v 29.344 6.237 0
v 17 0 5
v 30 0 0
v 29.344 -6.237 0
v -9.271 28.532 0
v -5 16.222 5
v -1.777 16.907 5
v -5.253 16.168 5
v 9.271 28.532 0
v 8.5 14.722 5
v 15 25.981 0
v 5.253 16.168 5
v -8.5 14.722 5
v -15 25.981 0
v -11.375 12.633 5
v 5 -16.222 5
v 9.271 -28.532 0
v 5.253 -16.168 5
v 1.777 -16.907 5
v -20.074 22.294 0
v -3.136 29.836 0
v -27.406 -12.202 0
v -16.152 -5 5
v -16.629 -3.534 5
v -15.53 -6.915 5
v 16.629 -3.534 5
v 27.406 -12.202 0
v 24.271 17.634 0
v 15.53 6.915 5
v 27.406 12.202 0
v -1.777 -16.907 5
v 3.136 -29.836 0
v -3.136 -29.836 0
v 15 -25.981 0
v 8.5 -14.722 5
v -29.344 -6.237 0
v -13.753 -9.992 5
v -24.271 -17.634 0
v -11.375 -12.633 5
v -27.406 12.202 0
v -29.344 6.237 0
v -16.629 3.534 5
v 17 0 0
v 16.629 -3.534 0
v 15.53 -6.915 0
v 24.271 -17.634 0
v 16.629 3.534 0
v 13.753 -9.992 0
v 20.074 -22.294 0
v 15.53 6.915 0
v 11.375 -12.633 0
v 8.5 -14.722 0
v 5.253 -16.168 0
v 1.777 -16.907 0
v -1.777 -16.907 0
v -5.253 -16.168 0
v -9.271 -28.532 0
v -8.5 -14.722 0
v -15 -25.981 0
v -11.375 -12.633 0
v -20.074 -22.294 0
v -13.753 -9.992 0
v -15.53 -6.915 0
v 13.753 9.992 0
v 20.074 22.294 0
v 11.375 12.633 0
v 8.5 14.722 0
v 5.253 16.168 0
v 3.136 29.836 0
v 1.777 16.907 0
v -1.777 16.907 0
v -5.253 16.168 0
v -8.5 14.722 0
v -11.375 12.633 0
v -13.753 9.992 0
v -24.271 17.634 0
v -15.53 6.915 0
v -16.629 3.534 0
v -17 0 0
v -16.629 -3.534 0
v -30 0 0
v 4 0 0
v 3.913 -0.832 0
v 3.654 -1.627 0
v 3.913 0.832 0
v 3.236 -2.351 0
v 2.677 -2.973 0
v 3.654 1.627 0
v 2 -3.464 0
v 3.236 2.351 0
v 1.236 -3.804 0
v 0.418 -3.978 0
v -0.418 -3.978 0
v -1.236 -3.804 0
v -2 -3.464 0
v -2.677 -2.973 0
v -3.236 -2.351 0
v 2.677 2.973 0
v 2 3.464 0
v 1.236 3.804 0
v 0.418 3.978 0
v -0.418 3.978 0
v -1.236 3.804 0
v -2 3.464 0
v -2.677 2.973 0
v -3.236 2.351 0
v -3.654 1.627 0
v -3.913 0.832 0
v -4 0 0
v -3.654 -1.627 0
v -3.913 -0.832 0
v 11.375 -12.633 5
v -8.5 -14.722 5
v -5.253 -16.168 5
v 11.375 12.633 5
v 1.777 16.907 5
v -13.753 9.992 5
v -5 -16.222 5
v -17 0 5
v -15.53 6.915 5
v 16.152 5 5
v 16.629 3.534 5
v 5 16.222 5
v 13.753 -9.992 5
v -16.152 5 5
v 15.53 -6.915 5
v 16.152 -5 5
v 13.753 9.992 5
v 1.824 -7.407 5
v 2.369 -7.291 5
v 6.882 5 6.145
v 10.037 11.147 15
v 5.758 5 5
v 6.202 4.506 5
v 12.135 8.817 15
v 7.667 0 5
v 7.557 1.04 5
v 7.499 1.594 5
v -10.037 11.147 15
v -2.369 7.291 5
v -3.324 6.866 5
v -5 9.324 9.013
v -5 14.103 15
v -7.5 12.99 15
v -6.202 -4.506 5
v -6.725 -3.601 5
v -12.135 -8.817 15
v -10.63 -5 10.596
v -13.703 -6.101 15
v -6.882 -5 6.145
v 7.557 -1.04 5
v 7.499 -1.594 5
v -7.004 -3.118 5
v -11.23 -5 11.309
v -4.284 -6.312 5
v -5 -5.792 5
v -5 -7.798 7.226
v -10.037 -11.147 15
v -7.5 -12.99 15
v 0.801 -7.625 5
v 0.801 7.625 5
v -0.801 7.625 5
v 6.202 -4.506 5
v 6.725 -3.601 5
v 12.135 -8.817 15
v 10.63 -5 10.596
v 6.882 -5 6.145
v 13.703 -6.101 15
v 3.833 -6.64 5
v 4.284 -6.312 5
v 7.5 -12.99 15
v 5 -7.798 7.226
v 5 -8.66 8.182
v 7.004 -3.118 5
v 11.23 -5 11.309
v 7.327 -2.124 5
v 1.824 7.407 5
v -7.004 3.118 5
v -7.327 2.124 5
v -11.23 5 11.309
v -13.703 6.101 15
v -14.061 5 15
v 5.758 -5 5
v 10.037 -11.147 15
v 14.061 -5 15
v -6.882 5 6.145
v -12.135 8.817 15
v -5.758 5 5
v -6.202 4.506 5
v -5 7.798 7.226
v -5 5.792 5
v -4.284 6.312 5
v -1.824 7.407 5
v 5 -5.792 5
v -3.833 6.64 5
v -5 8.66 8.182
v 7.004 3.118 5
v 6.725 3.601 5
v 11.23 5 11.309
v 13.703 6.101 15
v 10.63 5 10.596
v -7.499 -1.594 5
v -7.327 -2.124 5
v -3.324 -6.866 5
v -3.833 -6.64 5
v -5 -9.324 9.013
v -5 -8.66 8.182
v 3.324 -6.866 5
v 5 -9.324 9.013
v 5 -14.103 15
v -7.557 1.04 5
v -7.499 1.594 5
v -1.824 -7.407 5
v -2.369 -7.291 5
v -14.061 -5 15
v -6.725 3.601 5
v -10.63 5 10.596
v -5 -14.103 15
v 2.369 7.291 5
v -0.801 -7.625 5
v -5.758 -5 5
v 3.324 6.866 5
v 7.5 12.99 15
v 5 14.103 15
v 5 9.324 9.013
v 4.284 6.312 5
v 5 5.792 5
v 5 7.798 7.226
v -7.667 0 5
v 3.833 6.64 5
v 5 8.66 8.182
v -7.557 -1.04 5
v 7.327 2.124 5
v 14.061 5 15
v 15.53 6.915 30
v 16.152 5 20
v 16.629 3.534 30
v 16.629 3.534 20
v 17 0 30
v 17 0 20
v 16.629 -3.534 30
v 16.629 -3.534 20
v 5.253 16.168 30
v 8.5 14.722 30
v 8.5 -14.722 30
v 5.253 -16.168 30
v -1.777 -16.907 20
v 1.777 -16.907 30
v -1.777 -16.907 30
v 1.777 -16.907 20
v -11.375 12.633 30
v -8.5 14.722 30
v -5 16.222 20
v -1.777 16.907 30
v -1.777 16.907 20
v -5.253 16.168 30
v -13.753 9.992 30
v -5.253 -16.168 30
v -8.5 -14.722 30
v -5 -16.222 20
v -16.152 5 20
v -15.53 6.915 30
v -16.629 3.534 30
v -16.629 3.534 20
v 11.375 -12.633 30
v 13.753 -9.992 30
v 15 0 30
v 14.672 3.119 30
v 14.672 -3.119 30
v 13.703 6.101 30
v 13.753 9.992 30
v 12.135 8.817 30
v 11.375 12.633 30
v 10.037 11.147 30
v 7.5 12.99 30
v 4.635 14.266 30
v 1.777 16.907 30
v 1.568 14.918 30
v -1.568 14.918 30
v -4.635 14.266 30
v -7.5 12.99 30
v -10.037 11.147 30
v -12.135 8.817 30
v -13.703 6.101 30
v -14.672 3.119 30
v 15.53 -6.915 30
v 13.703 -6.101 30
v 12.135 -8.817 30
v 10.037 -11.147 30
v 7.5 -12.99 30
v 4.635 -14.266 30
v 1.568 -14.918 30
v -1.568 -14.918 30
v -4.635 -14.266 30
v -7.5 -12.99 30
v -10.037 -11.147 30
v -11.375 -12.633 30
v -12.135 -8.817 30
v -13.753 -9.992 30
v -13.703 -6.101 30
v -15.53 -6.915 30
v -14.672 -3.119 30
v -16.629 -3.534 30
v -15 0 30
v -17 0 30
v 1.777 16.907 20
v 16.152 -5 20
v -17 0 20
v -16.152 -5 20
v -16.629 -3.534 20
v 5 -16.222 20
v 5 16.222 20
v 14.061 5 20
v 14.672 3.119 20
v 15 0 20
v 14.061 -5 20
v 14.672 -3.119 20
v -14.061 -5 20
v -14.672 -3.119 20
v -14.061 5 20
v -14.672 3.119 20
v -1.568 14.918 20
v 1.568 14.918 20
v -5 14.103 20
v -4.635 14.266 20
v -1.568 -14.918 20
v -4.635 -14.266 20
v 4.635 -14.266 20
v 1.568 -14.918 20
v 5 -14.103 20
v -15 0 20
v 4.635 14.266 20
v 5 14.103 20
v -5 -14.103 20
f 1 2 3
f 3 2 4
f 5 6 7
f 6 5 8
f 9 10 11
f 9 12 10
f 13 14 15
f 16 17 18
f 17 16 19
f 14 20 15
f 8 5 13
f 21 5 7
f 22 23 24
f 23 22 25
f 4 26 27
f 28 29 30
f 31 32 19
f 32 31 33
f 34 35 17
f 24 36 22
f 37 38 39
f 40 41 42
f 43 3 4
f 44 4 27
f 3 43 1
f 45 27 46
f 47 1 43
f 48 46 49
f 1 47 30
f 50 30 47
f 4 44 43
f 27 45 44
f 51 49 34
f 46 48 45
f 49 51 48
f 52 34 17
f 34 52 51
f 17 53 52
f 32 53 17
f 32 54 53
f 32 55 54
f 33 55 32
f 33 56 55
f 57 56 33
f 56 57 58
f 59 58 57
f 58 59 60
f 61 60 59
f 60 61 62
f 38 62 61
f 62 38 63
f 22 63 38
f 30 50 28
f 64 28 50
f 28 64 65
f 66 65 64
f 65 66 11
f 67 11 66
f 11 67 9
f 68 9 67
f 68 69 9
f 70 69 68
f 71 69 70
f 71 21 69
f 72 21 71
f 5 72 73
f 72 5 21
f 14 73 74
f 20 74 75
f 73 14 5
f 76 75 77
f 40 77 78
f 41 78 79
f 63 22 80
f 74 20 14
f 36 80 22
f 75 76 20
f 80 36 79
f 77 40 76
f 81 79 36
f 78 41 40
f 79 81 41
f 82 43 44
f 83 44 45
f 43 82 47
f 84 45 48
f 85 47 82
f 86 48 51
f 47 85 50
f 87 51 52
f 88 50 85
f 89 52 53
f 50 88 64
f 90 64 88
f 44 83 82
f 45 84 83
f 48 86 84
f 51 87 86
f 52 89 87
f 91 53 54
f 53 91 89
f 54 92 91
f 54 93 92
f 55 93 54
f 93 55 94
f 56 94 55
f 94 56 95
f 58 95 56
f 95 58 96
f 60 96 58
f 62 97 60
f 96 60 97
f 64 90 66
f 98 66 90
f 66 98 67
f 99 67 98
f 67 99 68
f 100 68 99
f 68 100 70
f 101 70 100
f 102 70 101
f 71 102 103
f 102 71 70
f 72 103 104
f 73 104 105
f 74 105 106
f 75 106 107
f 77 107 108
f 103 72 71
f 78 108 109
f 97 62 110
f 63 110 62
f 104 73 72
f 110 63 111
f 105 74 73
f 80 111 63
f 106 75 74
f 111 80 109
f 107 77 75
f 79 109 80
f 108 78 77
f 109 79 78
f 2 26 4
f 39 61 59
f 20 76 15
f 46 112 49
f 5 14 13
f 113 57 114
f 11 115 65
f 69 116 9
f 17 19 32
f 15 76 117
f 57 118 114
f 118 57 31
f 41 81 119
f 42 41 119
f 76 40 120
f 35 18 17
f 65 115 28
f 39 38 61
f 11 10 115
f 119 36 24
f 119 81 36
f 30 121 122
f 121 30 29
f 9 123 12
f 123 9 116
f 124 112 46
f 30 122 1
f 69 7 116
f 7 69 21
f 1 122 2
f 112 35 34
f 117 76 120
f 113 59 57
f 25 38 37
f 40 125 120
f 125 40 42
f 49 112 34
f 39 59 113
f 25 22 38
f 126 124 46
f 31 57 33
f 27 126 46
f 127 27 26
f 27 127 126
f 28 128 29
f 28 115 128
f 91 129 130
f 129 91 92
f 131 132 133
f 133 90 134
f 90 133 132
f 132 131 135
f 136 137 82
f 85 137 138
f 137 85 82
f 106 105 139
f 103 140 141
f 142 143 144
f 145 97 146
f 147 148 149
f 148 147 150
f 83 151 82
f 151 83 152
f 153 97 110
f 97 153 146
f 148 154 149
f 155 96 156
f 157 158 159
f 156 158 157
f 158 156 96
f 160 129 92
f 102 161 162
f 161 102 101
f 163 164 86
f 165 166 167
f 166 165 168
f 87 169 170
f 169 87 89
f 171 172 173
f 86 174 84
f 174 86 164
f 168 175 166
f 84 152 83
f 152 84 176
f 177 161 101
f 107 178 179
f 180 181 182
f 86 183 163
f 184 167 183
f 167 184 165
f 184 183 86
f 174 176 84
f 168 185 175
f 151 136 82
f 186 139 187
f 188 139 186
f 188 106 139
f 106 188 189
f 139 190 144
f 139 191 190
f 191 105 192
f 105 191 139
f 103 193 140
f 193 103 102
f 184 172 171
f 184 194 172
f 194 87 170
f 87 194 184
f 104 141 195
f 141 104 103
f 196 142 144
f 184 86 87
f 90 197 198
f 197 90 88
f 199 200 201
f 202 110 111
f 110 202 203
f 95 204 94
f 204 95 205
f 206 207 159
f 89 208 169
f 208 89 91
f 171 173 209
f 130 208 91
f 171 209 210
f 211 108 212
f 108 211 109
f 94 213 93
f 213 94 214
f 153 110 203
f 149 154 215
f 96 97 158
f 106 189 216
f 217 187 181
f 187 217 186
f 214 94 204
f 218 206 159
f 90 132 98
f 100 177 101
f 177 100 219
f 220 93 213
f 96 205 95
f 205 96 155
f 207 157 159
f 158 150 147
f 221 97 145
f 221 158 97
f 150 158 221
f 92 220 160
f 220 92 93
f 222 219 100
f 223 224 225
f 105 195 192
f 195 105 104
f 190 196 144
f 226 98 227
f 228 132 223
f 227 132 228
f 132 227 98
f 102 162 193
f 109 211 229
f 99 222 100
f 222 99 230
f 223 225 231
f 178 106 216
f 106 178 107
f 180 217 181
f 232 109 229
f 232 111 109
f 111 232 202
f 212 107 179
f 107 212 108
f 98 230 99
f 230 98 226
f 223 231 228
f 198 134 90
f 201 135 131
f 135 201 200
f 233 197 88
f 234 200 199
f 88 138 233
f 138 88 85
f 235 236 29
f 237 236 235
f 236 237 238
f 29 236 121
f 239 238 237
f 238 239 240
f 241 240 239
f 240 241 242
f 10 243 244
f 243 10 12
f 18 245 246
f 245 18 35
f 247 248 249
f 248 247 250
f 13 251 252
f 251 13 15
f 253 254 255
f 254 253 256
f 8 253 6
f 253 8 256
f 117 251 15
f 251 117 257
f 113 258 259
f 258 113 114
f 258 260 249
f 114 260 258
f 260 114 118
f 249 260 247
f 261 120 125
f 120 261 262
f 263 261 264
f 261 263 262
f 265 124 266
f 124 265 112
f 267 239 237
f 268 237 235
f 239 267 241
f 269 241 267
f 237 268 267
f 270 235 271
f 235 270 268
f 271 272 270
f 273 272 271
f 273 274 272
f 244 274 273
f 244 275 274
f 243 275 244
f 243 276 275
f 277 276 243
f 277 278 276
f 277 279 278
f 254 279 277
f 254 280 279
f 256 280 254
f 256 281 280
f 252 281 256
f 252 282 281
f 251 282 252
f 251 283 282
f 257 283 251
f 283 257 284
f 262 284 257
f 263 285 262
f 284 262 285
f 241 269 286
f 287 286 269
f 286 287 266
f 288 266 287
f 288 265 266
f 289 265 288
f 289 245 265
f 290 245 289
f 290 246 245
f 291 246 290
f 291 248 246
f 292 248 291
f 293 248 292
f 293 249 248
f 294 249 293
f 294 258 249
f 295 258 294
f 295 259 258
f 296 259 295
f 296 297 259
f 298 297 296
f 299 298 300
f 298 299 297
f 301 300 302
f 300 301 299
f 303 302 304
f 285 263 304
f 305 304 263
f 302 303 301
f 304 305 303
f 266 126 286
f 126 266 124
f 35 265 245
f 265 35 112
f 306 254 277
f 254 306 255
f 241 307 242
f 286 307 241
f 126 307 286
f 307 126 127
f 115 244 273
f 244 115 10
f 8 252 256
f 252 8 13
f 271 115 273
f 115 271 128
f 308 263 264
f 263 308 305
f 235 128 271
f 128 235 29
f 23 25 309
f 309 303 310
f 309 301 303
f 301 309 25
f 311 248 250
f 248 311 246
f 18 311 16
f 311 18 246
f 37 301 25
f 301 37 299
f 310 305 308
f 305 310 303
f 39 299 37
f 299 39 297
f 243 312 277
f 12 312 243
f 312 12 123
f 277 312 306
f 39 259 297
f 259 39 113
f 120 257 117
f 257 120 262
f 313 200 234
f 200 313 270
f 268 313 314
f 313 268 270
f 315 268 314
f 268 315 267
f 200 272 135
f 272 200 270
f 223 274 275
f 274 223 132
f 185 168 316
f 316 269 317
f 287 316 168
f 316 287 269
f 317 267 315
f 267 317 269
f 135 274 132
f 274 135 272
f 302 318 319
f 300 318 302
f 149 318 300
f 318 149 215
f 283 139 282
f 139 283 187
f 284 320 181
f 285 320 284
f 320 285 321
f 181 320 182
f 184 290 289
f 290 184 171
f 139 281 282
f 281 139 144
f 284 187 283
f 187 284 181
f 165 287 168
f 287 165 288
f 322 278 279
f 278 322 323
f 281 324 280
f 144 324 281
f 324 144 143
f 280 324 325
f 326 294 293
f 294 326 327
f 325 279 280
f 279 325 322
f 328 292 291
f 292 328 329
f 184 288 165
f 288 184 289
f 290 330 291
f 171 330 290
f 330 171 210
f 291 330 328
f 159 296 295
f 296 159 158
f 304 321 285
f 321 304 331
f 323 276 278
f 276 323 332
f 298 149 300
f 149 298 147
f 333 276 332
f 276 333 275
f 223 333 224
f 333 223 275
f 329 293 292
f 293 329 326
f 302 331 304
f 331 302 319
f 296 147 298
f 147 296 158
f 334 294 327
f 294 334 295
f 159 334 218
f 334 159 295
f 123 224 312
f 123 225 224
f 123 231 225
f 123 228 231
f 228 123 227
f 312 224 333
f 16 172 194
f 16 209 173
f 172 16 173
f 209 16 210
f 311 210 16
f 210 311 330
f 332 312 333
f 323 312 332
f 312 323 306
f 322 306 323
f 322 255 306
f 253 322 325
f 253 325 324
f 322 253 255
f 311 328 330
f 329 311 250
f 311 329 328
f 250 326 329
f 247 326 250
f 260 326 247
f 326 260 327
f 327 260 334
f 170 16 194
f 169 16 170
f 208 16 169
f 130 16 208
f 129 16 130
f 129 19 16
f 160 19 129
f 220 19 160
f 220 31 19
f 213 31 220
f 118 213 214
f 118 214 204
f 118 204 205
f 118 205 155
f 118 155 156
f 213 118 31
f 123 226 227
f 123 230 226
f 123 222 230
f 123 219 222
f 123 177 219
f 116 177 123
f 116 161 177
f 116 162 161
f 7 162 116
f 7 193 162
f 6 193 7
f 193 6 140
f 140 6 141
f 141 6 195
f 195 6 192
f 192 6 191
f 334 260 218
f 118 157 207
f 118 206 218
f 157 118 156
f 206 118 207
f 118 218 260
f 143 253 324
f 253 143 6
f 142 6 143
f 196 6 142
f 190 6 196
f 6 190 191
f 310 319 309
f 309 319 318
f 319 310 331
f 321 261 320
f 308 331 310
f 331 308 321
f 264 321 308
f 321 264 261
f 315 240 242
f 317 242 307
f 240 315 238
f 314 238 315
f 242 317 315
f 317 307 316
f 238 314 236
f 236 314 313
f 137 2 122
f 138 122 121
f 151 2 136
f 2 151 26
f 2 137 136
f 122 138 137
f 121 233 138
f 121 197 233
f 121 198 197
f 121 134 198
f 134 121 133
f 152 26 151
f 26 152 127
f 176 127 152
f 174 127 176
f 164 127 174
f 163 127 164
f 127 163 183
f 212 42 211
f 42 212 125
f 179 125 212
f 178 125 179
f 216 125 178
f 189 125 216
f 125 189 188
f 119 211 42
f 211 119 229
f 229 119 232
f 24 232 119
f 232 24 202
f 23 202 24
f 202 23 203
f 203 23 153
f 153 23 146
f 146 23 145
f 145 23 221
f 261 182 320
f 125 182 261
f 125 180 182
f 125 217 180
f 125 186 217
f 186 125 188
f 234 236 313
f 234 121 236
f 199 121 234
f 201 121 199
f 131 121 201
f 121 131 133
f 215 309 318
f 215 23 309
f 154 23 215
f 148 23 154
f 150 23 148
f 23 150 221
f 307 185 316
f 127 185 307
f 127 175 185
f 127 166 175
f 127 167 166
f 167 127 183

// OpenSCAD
tube_diameter = 30; // mm 50 ml = 30 mm, 15 ml = 16
tube_conical_height = 15;
tube_conical_min = 8;

tube_radius = tube_diameter / 2;

rotating_angle = 0; // tilt the tube this angle away from vertical

z_diff = sin(rotating_angle) * (tube_radius + 2);

difference() {
union() {
            // foot
    difference() {
            cylinder(5,tube_radius * 2,tube_radius + 2);
            translate([0,0,-2])cylinder(2,tube_radius * 2,tube_radius * 2);
            translate([0,0,z_diff]) rotate([rotating_angle,0,0]) cylinder(tube_conical_height,tube_conical_min / 2,tube_radius);

    }



    translate([0,z_diff,z_diff]) rotate([rotating_angle,0,0]) difference() {
        cylinder(30,tube_radius + 2,tube_radius + 2); // outer wall
        translate([0,0,tube_conical_height]) cylinder(40,tube_radius,tube_radius);    // inner wall
        cylinder(tube_conical_height,tube_conical_min / 2,tube_radius);
    }
}

translate([-5,-25,5]) cube([10,50,15]);
            translate([-25,-5,5]) cube([50,10,15]);

}
